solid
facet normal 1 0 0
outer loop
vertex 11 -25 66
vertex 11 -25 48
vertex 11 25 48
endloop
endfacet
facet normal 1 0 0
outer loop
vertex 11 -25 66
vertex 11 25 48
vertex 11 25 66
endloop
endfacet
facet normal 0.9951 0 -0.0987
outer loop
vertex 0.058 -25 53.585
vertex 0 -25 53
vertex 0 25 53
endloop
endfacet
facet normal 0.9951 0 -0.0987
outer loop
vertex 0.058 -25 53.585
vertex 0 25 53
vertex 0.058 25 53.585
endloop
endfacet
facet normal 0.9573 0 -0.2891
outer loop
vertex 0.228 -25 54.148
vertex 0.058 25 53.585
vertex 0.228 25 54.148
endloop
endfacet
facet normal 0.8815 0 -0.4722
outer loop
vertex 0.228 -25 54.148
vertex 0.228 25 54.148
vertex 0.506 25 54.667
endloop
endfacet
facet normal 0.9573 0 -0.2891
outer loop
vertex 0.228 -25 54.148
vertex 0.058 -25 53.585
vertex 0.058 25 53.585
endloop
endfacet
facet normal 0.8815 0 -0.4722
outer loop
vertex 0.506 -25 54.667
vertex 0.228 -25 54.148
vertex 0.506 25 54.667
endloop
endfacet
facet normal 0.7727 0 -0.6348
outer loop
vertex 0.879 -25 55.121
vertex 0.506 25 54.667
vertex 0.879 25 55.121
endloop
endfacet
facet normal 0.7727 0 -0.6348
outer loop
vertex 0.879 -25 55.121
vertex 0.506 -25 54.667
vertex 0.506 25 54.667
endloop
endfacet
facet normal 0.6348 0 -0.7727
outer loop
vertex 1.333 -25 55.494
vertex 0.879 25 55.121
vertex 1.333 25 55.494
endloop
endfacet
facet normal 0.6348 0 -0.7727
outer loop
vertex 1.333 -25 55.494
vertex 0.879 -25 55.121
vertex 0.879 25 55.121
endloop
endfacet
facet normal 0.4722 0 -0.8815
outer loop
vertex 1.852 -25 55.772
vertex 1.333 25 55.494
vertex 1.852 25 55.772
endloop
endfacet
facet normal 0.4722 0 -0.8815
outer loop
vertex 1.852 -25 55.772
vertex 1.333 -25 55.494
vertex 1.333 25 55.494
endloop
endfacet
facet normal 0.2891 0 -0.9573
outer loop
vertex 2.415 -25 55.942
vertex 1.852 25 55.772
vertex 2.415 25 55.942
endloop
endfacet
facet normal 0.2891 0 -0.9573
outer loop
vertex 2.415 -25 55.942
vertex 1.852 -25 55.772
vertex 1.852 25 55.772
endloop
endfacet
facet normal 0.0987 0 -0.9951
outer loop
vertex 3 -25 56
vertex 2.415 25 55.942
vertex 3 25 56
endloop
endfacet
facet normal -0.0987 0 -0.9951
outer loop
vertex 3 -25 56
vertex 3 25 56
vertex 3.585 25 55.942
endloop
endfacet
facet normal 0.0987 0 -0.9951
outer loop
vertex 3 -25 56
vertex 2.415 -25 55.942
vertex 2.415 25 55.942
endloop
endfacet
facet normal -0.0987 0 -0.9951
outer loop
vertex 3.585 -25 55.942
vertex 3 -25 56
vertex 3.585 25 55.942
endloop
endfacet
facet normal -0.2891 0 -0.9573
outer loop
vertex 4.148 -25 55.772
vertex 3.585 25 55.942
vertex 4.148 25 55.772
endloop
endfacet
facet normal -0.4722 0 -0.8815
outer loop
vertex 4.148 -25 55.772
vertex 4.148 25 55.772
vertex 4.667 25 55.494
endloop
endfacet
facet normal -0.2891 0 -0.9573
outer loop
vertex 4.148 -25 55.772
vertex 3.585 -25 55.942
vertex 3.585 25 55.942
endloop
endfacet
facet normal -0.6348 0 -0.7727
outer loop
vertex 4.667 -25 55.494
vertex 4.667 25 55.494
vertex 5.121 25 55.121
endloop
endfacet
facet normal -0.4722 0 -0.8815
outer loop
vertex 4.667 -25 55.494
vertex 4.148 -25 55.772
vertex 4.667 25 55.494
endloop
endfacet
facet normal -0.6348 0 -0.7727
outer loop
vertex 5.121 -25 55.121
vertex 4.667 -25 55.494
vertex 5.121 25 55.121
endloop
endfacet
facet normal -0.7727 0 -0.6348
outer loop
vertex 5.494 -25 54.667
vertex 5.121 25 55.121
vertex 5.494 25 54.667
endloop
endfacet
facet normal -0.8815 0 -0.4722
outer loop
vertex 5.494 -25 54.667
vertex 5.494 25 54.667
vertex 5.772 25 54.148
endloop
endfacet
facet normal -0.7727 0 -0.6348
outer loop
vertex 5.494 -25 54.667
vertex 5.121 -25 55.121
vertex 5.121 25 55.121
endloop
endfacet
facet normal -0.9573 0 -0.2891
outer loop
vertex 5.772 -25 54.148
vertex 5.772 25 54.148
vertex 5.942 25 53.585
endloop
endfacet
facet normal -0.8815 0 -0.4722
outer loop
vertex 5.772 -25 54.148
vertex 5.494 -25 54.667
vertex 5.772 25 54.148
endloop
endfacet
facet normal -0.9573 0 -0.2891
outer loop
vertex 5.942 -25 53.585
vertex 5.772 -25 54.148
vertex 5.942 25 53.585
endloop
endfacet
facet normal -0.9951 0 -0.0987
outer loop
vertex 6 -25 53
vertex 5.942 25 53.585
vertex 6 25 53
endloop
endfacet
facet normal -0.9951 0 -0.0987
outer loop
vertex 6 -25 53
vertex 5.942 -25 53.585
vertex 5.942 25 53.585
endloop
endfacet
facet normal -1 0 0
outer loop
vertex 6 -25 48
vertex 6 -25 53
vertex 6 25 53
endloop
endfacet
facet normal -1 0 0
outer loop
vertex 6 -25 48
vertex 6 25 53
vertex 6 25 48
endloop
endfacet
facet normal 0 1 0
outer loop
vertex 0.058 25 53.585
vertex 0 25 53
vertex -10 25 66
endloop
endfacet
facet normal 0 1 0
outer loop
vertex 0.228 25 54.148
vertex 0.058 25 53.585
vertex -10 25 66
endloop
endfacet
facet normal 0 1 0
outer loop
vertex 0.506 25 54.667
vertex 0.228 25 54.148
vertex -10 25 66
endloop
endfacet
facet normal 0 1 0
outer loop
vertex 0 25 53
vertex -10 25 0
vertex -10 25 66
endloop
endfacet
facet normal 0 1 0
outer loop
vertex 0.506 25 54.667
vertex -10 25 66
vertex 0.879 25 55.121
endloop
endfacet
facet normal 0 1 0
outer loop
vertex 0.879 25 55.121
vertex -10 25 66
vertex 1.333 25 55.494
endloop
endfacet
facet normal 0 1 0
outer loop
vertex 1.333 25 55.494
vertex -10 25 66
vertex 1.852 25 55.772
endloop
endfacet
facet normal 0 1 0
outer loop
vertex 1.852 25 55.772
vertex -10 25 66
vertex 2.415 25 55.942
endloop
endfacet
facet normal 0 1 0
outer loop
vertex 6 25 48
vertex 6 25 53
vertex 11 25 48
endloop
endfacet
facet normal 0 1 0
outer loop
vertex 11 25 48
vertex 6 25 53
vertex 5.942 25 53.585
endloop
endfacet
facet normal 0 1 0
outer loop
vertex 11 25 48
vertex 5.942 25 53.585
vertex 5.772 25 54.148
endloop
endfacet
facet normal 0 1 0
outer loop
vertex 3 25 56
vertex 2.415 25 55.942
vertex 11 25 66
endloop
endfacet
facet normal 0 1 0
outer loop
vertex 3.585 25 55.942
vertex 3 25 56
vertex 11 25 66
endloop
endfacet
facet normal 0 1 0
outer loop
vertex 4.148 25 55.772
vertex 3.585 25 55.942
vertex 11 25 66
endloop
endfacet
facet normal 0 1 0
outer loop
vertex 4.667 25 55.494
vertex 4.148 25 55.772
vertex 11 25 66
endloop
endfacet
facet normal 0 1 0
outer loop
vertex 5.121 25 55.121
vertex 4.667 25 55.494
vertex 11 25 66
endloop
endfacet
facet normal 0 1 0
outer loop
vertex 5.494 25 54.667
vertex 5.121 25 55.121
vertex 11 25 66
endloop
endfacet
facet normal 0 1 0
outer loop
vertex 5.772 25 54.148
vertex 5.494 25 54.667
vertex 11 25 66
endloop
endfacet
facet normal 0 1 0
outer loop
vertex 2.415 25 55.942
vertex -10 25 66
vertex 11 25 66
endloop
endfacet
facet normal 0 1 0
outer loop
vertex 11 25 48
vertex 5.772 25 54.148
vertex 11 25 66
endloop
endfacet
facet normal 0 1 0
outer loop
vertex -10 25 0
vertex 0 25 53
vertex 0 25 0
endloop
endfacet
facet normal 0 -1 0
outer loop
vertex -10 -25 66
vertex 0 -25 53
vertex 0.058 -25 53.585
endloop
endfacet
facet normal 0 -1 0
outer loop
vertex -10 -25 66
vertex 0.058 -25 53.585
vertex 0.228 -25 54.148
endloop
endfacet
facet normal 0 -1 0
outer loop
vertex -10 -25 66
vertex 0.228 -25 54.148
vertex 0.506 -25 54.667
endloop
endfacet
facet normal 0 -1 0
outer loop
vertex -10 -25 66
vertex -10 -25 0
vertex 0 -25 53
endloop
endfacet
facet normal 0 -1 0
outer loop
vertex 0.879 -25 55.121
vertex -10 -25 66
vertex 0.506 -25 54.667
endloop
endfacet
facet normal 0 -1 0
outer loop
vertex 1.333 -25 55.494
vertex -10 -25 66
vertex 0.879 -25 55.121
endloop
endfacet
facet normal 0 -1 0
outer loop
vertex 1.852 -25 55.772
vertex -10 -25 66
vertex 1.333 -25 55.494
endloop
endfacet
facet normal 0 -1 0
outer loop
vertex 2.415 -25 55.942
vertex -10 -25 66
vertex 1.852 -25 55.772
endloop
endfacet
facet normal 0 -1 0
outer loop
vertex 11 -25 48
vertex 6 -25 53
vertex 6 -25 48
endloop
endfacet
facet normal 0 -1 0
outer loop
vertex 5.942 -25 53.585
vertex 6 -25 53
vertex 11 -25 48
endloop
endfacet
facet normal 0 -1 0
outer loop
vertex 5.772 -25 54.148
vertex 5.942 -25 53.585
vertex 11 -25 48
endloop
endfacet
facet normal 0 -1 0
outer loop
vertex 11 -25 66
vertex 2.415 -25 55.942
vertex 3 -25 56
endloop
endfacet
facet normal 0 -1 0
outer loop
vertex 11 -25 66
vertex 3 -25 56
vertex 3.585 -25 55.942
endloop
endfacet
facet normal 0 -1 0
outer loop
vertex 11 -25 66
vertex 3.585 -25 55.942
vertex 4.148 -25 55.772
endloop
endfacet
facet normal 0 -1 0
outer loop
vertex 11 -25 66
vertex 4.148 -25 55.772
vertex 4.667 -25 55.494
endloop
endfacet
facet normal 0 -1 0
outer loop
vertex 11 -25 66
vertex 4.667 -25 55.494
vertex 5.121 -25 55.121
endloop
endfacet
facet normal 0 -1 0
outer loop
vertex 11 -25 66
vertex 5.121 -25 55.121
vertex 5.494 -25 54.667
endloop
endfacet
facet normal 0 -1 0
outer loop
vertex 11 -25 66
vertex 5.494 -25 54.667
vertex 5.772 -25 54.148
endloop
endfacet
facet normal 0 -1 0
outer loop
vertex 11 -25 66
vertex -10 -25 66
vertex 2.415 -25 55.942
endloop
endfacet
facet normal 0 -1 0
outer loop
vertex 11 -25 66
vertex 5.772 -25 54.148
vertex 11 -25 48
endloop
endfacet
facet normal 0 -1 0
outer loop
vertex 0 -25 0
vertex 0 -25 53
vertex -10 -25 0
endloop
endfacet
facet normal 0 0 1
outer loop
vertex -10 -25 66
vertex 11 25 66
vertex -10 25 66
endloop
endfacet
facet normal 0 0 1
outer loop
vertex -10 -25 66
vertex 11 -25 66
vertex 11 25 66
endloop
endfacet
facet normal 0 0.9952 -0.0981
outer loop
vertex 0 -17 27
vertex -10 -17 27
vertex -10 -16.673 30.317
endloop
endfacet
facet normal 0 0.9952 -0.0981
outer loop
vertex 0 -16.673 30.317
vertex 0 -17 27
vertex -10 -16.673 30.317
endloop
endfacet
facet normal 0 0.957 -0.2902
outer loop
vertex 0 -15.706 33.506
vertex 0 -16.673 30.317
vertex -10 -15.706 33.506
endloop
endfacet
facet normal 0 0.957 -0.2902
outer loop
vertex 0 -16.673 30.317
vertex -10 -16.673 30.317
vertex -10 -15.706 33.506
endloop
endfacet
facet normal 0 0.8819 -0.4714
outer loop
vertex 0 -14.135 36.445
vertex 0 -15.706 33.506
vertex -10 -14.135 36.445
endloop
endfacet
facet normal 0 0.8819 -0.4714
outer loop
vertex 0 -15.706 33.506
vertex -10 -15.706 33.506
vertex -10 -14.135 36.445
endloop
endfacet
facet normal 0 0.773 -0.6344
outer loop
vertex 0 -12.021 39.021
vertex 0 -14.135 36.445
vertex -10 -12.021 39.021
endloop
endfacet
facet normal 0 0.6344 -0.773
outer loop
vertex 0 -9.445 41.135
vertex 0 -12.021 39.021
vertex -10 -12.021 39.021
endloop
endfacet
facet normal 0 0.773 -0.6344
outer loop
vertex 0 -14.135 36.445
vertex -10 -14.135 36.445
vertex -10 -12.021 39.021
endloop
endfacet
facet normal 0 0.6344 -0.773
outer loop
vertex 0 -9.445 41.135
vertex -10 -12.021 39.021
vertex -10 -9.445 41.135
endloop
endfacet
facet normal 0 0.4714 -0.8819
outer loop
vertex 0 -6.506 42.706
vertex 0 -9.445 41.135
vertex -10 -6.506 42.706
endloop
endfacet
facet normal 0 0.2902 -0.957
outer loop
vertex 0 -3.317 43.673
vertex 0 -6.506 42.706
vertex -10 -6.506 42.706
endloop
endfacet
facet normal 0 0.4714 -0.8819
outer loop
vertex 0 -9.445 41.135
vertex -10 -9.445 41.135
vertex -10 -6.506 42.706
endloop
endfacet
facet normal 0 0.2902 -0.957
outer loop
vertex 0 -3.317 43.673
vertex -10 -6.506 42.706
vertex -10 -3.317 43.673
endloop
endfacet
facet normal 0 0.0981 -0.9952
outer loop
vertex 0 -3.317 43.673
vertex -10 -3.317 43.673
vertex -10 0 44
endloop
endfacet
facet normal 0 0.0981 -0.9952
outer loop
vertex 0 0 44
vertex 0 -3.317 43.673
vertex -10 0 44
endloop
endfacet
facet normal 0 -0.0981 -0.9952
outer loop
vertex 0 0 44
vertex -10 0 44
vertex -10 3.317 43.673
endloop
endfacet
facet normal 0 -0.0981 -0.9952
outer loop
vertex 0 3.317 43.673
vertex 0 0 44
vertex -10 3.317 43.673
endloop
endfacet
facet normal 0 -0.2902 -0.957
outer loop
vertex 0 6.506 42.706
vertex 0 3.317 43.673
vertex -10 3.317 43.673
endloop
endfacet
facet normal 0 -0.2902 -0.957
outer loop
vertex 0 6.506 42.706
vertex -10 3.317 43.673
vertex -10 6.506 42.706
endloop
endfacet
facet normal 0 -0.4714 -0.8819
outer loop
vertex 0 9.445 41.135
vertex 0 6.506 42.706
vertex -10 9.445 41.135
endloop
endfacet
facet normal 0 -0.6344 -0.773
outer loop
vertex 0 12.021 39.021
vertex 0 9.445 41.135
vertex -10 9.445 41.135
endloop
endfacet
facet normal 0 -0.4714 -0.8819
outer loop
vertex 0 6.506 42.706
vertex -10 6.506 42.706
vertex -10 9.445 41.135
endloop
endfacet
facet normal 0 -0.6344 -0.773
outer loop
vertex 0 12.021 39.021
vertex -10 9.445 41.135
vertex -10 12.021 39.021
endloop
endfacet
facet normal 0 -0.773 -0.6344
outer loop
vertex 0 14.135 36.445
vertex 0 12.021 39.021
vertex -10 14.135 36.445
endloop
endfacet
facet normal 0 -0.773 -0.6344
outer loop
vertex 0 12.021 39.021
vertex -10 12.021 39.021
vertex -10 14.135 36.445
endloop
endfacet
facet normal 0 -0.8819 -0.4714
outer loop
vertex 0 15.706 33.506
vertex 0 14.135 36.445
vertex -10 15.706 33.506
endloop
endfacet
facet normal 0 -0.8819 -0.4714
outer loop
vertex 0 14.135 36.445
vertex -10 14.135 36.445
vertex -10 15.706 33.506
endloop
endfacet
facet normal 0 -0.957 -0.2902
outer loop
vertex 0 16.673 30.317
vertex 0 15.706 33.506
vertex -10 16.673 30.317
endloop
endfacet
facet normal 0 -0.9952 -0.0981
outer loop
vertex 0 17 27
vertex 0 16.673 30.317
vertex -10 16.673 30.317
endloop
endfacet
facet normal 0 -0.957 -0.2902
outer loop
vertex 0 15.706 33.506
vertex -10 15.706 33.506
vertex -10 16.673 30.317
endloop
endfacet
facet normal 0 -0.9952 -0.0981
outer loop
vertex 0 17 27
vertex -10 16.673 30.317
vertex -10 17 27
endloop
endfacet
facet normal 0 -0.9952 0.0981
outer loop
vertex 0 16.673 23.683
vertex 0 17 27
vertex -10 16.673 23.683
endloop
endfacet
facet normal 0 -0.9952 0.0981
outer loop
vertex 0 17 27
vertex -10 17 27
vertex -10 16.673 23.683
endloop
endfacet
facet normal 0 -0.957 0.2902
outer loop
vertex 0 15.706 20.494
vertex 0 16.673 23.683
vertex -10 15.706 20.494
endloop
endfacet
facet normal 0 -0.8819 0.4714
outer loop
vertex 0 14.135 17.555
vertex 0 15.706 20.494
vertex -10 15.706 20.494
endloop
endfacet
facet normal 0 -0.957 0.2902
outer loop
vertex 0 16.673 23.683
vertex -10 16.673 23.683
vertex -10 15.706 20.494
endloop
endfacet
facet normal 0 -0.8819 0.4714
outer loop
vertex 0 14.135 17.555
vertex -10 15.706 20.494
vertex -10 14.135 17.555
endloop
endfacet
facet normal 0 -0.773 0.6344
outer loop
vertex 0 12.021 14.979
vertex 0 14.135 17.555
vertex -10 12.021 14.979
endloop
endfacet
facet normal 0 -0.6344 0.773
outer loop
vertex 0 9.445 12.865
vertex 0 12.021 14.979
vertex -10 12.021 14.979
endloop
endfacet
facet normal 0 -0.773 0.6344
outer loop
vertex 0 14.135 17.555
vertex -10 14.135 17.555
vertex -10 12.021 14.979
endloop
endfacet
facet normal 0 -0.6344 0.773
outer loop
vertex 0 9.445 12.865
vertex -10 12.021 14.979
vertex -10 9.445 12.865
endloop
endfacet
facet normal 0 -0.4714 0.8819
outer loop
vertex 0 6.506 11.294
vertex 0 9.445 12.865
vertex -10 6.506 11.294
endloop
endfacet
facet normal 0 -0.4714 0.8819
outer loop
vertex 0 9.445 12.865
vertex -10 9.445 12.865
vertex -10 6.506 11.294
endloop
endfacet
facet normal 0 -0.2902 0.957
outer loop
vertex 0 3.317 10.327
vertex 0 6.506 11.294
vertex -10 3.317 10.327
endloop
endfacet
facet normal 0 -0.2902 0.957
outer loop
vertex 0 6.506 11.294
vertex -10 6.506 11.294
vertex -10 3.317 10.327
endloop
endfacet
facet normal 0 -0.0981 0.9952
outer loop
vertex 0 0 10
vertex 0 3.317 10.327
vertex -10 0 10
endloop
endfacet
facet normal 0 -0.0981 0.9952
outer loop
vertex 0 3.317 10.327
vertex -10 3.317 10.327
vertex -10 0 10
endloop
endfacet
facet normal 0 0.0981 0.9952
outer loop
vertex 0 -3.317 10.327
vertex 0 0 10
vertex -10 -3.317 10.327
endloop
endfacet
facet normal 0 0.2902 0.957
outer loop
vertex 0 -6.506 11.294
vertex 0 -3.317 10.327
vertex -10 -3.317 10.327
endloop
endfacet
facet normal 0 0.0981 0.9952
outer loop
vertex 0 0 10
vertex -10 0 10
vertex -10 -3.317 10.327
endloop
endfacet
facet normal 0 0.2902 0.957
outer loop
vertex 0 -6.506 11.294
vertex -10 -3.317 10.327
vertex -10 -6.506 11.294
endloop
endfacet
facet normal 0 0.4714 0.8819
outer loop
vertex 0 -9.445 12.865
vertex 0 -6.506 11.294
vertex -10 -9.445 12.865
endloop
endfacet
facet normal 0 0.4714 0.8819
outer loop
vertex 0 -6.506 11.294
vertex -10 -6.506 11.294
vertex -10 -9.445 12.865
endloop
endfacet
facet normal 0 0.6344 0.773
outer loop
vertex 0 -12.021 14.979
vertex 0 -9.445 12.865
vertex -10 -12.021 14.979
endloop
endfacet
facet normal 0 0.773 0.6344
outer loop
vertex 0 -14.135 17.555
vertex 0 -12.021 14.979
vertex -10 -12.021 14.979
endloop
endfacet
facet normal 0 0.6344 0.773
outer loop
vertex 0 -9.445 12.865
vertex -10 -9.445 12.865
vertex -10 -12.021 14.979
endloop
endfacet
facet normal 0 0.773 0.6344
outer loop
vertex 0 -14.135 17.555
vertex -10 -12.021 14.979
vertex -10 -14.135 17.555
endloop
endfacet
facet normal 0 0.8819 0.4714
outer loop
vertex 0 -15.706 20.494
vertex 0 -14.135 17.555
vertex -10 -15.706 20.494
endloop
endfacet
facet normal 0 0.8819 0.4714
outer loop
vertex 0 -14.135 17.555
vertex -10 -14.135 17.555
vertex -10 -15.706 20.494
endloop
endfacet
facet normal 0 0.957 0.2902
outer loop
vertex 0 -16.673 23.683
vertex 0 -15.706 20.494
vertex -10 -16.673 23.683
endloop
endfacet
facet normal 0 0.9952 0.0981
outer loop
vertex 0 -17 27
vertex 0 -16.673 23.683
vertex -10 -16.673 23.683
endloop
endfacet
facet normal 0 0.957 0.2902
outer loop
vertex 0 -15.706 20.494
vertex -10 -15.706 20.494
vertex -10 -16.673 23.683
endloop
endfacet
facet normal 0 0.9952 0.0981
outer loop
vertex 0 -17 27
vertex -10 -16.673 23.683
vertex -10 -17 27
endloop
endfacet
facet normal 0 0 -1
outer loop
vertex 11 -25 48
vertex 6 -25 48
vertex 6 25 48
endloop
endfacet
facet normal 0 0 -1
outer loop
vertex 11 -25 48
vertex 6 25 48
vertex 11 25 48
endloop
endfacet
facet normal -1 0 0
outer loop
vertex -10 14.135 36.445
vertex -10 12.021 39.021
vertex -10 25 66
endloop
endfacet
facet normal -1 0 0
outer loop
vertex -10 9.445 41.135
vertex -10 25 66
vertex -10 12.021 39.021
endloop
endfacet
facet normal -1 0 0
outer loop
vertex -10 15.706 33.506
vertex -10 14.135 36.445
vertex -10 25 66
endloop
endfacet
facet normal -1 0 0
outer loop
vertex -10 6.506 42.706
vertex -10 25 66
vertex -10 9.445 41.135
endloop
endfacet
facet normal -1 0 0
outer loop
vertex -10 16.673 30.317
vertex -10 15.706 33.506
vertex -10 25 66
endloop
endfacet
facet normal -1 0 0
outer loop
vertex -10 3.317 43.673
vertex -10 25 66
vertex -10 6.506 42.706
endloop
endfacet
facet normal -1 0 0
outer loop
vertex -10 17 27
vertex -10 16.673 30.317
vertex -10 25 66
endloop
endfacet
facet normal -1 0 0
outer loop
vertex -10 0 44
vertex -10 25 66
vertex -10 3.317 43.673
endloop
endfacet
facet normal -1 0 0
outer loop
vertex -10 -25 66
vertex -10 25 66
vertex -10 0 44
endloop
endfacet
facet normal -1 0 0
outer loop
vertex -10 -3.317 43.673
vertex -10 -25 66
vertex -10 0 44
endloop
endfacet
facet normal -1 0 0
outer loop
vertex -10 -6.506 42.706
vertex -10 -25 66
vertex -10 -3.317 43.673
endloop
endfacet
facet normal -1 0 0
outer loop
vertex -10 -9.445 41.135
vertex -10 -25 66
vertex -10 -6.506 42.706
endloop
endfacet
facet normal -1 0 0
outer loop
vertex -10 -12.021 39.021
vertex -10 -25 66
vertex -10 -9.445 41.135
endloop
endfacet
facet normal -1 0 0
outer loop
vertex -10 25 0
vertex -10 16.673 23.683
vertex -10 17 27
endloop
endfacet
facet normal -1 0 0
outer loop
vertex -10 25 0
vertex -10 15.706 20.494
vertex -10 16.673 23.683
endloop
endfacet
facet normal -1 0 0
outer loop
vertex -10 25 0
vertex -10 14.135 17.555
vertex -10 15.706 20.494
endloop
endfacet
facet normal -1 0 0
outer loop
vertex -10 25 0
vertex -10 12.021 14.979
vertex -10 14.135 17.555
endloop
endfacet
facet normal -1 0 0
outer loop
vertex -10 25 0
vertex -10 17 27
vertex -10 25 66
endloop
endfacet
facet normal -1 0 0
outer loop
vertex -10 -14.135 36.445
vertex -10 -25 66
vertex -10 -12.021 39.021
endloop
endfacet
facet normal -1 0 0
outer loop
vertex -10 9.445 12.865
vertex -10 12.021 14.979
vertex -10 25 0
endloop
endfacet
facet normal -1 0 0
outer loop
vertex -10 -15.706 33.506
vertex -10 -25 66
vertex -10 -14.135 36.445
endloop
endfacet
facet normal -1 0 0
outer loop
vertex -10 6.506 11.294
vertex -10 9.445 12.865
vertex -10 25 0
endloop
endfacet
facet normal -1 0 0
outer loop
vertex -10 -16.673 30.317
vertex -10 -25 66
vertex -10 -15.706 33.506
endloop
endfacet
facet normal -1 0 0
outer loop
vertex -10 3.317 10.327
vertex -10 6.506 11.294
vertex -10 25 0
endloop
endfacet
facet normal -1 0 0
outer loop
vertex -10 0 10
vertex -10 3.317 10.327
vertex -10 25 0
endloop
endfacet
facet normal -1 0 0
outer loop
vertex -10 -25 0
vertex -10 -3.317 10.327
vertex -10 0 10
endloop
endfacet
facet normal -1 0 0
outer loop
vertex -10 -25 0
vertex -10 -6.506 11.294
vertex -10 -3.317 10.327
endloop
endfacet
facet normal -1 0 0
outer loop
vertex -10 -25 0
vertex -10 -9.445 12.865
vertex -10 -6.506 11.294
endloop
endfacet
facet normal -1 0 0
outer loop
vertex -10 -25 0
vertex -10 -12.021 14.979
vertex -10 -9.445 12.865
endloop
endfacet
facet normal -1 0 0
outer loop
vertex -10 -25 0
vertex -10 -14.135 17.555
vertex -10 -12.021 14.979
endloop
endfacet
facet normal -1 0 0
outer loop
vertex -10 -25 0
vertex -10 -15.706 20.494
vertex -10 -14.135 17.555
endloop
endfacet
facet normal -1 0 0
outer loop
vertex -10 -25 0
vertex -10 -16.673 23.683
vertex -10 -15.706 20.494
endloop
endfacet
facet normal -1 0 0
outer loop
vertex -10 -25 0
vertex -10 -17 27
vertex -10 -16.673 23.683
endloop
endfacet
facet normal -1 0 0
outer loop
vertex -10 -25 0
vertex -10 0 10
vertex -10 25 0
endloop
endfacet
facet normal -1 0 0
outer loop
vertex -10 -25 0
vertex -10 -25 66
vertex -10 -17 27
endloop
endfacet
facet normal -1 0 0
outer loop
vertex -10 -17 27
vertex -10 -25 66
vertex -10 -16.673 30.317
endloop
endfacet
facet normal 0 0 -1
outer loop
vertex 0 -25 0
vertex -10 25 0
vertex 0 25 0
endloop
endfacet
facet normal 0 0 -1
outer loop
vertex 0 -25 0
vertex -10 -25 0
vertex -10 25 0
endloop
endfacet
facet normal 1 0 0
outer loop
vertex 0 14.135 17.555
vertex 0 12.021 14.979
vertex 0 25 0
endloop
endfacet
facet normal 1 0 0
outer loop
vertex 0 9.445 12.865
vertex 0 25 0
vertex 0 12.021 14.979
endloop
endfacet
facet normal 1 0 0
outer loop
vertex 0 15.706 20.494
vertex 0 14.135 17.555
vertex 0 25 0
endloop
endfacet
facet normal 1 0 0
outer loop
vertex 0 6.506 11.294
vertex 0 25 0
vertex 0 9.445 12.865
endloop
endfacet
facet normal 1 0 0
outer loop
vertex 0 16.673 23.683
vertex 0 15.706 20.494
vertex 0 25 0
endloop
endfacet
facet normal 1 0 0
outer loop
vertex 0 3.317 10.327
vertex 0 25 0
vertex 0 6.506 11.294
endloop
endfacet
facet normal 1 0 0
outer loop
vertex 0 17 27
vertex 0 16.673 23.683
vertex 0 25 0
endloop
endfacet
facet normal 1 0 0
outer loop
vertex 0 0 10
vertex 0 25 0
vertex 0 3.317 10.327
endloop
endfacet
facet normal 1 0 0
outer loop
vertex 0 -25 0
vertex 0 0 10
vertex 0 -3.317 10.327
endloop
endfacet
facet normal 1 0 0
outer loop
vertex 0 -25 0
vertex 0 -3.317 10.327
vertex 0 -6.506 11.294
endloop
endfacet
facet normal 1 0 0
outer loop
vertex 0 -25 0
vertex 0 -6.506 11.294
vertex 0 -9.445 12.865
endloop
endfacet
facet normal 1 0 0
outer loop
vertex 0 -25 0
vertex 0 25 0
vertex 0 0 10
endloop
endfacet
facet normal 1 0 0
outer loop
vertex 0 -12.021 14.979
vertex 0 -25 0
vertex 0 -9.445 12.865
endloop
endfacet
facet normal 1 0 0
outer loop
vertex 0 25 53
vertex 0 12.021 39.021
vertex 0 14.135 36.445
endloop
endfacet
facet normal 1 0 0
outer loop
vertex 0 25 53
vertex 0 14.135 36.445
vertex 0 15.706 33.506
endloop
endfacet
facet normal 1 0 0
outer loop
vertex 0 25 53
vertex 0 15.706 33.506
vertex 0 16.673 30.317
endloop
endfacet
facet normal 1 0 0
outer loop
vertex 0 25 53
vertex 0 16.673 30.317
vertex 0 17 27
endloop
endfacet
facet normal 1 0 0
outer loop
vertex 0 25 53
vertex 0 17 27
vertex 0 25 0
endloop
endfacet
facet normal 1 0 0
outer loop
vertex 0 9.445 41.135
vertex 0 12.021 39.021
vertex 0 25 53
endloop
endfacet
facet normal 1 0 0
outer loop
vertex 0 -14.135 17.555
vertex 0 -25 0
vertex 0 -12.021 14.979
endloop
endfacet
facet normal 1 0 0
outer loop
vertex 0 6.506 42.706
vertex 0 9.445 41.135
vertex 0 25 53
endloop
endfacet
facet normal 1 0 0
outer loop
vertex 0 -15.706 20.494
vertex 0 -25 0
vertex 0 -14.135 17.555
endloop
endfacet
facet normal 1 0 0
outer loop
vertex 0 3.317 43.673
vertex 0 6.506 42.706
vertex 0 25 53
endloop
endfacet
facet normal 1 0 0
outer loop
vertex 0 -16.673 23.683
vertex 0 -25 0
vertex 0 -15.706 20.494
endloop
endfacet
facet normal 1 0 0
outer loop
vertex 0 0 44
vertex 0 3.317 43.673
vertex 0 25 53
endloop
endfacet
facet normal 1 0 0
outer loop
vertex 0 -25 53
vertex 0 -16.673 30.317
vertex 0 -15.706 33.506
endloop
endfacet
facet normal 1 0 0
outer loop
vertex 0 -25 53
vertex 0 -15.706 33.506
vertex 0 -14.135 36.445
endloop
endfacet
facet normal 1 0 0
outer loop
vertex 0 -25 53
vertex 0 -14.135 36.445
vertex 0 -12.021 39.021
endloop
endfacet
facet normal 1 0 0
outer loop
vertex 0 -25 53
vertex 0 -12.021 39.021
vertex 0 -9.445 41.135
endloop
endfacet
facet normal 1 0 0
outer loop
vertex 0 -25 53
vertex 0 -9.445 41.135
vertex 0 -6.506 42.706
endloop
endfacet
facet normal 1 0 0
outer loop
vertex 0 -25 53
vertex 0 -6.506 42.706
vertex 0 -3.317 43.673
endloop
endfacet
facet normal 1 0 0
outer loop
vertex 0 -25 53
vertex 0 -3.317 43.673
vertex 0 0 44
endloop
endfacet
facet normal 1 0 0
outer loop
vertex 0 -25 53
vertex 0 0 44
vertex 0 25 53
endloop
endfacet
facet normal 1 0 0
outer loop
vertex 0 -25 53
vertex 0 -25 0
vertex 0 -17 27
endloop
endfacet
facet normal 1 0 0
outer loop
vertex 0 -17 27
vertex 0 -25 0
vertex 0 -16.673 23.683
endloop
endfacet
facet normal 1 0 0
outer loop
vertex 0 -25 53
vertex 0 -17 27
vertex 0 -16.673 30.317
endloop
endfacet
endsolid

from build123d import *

# Parameters (mm, degrees)
F1_DEPTH = 25
F2_R     = 17
F3_DEPTH = 10


with BuildPart() as f1:
    # F0 (on Front) → F1 (new body, symmetric)
    with BuildSketch(Plane.XZ):
        Polygon((-10, 0), (0, 0), (0, 53), (0, 66), (-10, 66), align=None)
        with BuildLine():
            Line((0, 66), (0, 53))
            ThreePointArc((0, 53), (3, 56), (6, 53))
            Line((6, 53), (6, 66))
            Line((6, 66), (0, 66))
        make_face()
        Polygon((6, 66), (6, 53), (6, 48), (11, 48), (11, 66), align=None)
    extrude(amount=F1_DEPTH, both=True)

    # F2 (on face) → F3 (cut, through all)
    with BuildSketch(Plane(origin=(-10, 0, 0), x_dir=(0, -1, 0), z_dir=(-1, 0, 0))):
        with Locations((0, 27)):
            Circle(F2_R)
    extrude(amount=-F3_DEPTH, mode=Mode.SUBTRACT)


solid = f1.part
